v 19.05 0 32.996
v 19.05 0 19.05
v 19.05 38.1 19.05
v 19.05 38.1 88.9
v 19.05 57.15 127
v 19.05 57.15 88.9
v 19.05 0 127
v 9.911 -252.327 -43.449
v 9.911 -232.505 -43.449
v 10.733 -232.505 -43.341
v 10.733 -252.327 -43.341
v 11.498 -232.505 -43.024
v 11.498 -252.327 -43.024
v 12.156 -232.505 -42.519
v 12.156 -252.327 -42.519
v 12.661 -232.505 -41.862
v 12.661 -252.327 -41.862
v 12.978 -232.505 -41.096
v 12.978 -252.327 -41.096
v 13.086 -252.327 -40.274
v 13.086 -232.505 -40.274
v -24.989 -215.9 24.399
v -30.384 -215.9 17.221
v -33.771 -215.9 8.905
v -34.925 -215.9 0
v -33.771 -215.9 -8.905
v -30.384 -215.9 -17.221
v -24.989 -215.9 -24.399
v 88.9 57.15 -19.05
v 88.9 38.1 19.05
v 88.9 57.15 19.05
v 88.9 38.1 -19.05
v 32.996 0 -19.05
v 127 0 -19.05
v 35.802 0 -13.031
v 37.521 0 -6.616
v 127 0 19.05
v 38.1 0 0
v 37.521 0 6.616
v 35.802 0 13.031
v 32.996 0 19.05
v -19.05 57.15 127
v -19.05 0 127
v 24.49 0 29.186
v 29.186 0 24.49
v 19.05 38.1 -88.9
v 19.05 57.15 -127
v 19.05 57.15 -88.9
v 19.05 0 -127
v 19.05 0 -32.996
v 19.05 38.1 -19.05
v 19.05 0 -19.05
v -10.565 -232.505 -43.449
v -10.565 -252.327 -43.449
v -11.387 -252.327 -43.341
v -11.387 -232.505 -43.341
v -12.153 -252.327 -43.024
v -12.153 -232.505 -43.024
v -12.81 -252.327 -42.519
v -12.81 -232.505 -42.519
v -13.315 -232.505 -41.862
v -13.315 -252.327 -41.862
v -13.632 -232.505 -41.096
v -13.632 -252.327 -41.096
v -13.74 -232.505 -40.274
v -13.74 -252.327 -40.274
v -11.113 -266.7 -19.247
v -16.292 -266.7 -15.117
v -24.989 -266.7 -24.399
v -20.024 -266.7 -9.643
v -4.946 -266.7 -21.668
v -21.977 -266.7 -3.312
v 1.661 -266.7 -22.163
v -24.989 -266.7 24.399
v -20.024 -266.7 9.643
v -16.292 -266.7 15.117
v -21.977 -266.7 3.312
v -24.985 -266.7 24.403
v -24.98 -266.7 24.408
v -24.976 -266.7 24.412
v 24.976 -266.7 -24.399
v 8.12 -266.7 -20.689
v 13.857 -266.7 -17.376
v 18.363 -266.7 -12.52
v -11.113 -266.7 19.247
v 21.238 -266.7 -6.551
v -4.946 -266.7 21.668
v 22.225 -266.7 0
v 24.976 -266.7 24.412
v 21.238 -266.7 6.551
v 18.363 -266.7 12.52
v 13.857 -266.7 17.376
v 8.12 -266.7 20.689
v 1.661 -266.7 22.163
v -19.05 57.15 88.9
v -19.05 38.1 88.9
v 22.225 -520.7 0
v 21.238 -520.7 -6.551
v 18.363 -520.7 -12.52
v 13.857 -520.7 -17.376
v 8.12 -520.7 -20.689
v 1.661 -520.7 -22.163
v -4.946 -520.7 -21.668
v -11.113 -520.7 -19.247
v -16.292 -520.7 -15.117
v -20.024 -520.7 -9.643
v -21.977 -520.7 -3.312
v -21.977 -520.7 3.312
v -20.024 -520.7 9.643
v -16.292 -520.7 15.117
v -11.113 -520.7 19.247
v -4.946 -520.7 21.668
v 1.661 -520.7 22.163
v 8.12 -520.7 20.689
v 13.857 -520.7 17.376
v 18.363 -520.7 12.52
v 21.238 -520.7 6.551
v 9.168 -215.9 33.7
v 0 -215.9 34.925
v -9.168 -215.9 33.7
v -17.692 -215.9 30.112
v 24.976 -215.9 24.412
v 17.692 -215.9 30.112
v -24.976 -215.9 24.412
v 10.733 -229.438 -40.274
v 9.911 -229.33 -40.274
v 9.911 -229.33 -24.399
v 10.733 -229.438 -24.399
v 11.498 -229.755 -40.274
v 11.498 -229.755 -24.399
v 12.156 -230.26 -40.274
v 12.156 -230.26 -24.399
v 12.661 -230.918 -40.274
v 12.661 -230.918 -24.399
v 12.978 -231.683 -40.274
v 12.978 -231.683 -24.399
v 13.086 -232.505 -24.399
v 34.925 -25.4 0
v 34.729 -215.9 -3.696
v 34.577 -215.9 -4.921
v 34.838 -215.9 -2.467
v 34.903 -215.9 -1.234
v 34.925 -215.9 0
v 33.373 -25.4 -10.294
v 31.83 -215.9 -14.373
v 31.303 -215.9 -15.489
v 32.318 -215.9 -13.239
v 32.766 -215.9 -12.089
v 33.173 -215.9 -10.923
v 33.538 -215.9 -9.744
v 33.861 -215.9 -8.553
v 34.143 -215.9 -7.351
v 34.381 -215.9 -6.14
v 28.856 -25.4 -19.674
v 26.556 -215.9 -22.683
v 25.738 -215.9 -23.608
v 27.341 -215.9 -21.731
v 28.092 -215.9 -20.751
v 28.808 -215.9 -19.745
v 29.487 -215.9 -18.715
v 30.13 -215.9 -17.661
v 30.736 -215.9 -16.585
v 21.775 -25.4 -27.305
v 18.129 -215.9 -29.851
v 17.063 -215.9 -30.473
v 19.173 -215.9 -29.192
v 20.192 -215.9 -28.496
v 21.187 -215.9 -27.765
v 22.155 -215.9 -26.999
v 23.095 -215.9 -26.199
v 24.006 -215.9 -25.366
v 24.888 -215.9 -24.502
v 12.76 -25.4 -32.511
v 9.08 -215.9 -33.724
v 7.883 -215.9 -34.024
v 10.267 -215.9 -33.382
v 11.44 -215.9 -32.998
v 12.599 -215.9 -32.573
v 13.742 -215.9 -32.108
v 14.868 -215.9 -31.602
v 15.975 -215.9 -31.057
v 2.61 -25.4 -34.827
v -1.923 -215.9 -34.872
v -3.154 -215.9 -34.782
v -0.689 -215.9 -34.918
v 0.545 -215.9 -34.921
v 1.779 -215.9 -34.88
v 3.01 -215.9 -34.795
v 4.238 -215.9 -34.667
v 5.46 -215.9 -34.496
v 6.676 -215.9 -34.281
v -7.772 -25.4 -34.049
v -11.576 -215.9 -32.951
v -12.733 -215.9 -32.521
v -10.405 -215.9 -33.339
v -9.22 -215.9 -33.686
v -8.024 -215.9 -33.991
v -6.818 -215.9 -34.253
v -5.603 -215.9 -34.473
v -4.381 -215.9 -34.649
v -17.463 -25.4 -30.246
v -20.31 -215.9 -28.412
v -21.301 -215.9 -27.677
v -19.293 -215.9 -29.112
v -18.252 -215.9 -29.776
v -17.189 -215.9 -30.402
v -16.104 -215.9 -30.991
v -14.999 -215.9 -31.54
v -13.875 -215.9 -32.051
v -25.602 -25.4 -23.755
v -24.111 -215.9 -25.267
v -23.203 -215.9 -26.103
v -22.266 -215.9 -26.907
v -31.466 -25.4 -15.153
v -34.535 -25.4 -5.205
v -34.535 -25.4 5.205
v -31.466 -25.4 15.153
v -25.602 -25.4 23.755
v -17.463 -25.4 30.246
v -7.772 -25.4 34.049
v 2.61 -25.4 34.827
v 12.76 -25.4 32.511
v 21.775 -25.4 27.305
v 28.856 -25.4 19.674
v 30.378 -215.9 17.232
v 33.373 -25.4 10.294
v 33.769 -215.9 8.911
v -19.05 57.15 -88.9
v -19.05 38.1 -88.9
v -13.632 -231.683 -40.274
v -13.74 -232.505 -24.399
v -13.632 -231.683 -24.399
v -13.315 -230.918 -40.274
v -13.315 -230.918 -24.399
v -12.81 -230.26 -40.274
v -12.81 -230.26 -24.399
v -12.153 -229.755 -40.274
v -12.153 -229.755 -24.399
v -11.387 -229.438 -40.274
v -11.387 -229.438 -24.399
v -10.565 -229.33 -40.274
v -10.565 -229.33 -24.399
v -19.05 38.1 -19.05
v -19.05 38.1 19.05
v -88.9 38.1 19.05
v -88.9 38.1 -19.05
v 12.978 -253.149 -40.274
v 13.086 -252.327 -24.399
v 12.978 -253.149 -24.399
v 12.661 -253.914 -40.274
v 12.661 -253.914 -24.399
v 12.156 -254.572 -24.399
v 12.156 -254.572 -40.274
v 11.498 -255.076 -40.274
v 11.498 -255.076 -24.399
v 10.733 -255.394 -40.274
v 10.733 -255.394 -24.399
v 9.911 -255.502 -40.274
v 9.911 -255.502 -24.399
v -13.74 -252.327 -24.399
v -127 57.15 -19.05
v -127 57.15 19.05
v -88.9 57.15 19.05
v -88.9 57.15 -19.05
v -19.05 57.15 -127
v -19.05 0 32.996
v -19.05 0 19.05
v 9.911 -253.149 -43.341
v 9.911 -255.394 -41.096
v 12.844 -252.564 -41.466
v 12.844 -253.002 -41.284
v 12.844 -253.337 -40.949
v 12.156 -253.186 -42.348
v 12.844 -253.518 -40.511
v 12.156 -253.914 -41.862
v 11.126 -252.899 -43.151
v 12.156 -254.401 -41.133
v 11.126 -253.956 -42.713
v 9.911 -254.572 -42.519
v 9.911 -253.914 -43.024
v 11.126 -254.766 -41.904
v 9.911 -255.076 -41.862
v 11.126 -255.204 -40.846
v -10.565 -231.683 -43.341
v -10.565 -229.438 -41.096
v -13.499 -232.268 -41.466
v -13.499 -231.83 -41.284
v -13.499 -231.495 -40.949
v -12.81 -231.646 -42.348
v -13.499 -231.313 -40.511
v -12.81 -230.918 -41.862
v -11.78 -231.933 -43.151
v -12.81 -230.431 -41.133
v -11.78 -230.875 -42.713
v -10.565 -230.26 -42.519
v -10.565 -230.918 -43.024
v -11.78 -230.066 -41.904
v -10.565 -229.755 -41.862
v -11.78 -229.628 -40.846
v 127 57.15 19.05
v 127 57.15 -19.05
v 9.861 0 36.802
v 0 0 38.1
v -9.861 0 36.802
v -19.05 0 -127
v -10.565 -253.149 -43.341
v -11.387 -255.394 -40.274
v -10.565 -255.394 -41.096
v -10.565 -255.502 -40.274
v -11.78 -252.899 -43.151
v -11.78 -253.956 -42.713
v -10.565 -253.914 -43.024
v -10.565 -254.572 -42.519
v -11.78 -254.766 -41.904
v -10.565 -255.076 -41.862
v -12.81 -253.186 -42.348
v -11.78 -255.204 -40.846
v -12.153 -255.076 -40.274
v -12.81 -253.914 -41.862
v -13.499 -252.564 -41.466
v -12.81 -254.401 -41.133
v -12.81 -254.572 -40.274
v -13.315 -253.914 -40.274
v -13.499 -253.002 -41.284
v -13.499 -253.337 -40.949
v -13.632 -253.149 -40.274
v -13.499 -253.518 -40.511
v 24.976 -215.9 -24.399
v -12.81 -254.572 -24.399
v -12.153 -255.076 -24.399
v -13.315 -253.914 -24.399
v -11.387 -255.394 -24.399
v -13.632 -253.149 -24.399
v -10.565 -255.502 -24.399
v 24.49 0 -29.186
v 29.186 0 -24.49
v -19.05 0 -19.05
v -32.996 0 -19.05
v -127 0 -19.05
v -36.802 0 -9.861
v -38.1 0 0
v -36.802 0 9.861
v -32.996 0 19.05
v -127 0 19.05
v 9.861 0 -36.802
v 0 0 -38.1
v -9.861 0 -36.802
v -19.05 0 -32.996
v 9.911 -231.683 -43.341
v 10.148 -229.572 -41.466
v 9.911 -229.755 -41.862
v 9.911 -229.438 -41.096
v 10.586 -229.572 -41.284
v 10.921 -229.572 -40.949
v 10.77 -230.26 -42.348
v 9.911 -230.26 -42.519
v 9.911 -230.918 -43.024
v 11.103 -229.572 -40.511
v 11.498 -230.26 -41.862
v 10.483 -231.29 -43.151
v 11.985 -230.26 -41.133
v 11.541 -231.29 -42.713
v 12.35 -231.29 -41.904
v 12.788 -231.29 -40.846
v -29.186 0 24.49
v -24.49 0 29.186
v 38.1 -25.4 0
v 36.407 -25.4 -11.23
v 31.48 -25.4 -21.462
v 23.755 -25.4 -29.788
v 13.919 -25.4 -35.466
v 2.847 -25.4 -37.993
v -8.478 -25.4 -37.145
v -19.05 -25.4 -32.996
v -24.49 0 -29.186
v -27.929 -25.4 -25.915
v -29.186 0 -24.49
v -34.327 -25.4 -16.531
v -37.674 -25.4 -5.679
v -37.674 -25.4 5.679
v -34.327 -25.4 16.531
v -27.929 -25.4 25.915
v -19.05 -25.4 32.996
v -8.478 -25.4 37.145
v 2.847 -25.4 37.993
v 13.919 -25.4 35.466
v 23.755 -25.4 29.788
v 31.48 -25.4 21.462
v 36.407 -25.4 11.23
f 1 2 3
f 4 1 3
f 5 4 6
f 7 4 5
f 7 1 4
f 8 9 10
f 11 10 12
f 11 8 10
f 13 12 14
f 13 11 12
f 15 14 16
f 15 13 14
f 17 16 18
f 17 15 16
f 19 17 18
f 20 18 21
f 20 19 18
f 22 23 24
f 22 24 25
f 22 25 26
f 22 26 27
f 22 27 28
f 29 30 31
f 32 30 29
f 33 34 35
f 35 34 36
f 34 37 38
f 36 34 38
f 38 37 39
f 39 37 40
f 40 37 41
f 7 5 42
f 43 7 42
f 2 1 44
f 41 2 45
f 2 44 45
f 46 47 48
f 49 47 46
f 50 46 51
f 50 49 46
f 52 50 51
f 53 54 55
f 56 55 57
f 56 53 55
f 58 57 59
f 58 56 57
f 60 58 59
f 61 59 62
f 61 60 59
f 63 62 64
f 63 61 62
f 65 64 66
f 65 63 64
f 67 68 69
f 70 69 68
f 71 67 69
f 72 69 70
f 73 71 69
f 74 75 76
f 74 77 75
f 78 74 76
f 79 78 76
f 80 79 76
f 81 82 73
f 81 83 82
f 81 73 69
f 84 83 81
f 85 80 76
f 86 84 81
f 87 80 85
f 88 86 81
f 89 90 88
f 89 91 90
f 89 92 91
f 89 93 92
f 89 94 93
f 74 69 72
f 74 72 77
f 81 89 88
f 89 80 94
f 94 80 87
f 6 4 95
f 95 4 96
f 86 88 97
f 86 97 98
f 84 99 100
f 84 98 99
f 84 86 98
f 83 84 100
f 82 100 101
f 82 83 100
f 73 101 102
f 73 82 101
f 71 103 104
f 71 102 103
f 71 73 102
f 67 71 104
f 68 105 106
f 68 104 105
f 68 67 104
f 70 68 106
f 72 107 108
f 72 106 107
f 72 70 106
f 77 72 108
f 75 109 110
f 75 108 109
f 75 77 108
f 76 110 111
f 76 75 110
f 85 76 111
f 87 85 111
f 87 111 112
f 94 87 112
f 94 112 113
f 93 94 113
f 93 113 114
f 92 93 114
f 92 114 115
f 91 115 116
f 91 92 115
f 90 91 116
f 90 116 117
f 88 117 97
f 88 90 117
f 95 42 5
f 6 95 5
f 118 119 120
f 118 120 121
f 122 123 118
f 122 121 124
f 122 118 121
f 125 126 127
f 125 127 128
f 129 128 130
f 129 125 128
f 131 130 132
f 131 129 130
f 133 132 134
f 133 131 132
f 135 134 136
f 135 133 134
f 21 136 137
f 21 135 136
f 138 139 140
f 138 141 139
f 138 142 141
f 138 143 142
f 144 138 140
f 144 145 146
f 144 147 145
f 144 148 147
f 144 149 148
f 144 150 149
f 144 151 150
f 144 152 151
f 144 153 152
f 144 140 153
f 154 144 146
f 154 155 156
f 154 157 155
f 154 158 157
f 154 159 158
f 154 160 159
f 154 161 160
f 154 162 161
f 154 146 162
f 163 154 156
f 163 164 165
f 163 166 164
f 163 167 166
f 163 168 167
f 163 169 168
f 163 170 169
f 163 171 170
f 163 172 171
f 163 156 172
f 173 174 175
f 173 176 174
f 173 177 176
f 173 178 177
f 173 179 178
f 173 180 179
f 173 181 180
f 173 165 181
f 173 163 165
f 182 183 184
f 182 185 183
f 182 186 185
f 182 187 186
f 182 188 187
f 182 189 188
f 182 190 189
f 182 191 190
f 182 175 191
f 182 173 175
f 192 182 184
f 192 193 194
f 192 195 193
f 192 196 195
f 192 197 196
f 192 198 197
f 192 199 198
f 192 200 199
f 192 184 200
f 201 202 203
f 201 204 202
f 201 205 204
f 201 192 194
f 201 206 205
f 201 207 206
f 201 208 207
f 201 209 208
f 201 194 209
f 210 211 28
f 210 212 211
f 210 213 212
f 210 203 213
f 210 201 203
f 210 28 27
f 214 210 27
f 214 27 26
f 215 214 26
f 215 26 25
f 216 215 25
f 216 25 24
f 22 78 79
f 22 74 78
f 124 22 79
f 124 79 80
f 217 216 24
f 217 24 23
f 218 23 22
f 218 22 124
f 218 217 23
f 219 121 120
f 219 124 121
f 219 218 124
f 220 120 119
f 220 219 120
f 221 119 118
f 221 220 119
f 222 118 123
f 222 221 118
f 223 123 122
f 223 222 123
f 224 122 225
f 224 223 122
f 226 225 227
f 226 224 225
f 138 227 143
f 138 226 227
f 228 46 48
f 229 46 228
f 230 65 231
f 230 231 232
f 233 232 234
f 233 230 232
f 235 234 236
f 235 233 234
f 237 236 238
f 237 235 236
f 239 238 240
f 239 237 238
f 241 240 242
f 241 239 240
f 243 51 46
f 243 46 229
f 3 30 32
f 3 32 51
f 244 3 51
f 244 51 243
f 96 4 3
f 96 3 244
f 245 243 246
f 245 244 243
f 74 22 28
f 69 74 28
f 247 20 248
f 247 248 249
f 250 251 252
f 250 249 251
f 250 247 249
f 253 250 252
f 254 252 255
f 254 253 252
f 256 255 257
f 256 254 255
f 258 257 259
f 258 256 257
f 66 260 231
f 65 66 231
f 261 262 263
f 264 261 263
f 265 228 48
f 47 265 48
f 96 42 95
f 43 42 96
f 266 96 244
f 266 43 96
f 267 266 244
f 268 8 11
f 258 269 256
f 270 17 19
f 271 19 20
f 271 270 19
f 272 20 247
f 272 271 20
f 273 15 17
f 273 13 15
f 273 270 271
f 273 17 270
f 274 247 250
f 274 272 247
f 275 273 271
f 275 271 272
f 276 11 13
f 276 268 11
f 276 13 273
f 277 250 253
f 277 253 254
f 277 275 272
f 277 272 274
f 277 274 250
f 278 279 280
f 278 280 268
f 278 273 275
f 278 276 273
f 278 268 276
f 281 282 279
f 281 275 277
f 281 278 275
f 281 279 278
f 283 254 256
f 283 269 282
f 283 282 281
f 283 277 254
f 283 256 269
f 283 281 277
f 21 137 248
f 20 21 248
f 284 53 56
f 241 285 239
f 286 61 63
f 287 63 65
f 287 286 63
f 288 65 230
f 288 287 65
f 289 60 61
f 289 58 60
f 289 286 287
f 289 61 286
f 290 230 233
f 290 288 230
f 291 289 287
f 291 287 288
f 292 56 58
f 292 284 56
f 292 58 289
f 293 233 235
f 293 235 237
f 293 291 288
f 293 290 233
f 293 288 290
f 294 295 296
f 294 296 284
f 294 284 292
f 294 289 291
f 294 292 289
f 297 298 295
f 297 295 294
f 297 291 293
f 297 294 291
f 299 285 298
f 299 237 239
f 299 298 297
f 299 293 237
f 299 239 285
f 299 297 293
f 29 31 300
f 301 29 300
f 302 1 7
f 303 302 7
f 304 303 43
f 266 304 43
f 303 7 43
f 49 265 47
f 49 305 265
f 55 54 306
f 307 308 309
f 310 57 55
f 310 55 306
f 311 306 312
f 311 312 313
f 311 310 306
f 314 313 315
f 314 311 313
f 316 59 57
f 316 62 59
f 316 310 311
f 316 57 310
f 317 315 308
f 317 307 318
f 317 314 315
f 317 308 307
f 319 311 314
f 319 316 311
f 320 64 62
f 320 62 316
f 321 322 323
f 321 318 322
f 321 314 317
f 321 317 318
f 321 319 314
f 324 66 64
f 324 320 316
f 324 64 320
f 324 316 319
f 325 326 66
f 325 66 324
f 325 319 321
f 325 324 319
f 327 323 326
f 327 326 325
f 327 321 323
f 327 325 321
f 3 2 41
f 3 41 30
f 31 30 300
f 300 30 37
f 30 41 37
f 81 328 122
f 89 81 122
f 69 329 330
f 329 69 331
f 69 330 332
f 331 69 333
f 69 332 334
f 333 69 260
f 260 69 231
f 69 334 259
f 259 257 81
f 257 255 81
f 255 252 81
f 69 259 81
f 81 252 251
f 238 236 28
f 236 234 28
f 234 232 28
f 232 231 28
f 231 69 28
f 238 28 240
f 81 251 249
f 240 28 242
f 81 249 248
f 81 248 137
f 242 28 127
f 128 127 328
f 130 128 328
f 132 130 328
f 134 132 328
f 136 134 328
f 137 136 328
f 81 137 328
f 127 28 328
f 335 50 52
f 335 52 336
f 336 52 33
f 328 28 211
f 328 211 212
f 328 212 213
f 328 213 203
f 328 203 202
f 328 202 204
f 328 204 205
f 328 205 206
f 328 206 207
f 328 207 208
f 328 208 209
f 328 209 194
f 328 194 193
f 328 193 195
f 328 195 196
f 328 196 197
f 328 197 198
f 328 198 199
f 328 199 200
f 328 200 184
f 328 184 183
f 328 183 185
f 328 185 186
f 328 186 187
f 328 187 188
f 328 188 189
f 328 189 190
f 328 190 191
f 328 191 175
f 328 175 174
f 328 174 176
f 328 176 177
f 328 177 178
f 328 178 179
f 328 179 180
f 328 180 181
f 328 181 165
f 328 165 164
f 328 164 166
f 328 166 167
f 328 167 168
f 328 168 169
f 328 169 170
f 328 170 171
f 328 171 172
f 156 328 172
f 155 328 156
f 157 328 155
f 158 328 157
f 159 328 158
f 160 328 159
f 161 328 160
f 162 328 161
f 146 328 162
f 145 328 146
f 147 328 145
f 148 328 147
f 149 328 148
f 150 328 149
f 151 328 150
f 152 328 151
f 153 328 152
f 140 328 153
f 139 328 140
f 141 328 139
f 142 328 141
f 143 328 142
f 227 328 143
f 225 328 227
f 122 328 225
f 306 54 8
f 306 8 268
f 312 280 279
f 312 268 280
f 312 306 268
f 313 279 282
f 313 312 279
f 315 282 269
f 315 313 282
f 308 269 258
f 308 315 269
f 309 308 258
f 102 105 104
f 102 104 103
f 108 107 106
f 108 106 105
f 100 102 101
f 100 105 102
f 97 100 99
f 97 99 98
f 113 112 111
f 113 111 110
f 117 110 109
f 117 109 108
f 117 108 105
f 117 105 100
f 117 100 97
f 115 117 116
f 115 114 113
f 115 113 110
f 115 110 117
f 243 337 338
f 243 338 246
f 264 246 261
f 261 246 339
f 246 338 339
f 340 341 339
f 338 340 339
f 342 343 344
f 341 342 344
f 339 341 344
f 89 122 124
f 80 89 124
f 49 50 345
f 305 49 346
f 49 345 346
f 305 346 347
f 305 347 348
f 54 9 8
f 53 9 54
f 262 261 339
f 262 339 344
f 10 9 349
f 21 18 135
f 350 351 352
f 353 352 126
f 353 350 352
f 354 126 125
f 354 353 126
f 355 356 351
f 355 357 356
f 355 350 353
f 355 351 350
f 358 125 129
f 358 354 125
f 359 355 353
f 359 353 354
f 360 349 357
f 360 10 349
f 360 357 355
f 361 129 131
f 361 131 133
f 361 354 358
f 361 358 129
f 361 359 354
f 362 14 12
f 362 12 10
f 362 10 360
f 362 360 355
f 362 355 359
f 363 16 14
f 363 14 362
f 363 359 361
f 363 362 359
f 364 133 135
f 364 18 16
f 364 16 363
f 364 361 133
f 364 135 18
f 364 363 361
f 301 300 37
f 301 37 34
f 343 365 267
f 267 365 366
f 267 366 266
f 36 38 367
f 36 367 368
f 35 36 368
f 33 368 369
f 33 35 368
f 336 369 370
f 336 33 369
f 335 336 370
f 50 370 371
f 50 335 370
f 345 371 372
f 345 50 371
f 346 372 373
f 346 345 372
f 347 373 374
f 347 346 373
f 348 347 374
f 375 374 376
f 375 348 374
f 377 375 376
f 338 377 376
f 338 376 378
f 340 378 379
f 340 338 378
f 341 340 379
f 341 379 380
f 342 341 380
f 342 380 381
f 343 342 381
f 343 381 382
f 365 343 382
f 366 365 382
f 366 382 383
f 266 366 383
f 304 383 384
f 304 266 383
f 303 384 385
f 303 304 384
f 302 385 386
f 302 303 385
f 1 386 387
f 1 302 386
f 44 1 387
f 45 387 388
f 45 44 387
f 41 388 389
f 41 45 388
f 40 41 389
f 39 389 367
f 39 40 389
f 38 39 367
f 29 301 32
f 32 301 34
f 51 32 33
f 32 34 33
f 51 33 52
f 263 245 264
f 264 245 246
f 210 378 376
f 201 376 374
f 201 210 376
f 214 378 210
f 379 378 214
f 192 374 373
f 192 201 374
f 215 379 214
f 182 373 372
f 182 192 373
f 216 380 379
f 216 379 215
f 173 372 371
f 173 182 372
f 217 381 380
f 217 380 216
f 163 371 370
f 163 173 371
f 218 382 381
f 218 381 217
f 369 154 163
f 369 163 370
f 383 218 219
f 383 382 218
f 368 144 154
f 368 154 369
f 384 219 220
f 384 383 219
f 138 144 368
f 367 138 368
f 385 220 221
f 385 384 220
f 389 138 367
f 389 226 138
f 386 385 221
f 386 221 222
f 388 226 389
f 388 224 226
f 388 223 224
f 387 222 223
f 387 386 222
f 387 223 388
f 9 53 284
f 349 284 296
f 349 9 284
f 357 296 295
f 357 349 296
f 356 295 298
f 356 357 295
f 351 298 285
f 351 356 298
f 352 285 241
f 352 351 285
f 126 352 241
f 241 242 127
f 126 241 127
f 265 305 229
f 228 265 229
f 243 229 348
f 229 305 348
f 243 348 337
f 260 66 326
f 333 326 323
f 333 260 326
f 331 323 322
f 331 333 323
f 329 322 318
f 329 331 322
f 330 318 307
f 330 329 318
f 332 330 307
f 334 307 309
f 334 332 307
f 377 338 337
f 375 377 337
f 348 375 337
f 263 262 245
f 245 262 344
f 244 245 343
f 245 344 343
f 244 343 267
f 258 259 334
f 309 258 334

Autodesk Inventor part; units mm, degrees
ref_plane "YZ Plane" through (0, 0, 0) normal (1, 0, 0) x (0, 1, 0)
ref_plane "XZ Plane" through (0, 0, 0) normal (0, 1, 0) x (-1, 0, 0)
ref_plane "XY Plane" through (0, 0, 0) normal (0, 0, 1) x (1, 0, 0)
sketch "Sketch1" plane through (0, 0, 0) normal (0, 1, 0) x (-1, 0, 0)
  line L0 (-127, 19.05) -> (-127, -19.05)
  line L1 (127, -19.05) -> (127, 19.05)
  line L2 (0, -127) -> (19.05, -127)
  line L3 (19.05, -127) -> (19.05, -19.05)
  line L4 (19.05, 0) -> (0, 0)
  line L5 (0, -127) -> (-19.05, -127)
  line L6 (-19.05, -127) -> (-19.05, -19.05)
  line L7 (-19.05, 0) -> (0, 0)
  line L8 (0, 0) -> (0, -127)
  line L9 (19.05, 0) -> (0, 0)
  line L10 (-19.05, 0) -> (-19.05, 127)
  line L11 (-19.05, 127) -> (19.05, 127)
  line L12 (19.05, 127) -> (19.05, 19.05)
  line L13 (-127, -19.05) -> (-19.05, -19.05)
  line L14 (19.05, -19.05) -> (127, -19.05)
  line L15 (127, 19.05) -> (19.05, 19.05)
  line L16 (-19.05, 19.05) -> (-127, 19.05)
  point P0 (127, 0)
  point P1 (-127, 0)
  point P2 (0, 19.05)
  point P3 (0, -19.05)
  dimension "d7" = 127
  dimension "d8" = 19.05
  dimension "d9" = 127
extrude "Extrusion1" add sketch "Sketch1" along normal blind 38.1
sketch "Sketch2" plane through (0, 38.1, 0) normal (0, 1, 0) x (1, 0, 0)
  line L0 (-19.05, -127) -> (19.05, -127) projected
  line L1 (-19.05, -127) -> (19.05, -127)
  line L2 (19.05, -127) -> (19.05, -88.9)
  line L3 (19.05, -88.9) -> (-19.05, -88.9)
  line L4 (-19.05, -88.9) -> (-19.05, -127)
  line L5 (-19.05, 127) -> (-19.05, 19.05) projected
  line L6 (19.05, 19.05) -> (19.05, 127) projected
  line L7 (-19.05, 127) -> (19.05, 127)
  line L8 (19.05, 127) -> (19.05, 88.9)
  line L9 (19.05, 88.9) -> (-19.05, 88.9)
  line L10 (-19.05, 88.9) -> (-19.05, 127)
  line L11 (-127, -19.05) -> (-19.05, -19.05) projected
  line L12 (-19.05, 19.05) -> (-127, 19.05) projected
  line L13 (-127, -19.05) -> (-88.9, -19.05)
  line L14 (-88.9, -19.05) -> (-88.9, 19.05)
  line L15 (-88.9, 19.05) -> (-127, 19.05)
  line L16 (-127, 19.05) -> (-127, -19.05)
  line L17 (127, -19.05) -> (127, 19.05) projected
  line L18 (127, 19.05) -> (19.05, 19.05) projected
  line L19 (127, -19.05) -> (88.9, -19.05)
  line L20 (88.9, -19.05) -> (88.9, 19.05)
  line L21 (88.9, 19.05) -> (127, 19.05)
  line L22 (127, 19.05) -> (127, -19.05)
  point P0 (0, 0)
  point P1 (-19.05, 88.9)
  dimension "d12" = 38.1
  dimension "d13" = 38.1
  dimension "d14" = 38.1
  dimension "d15" = 38.1
  dimension "d16" = 38.1
extrude "Extrusion2" add sketch "Sketch2" along normal blind 19.05
sketch "Sketch3" plane through (0, 0, 0) normal (0, -1, 0) x (1, 0, 0)
  circle A0 centre (0, 0) radius 38.1
  dimension "d19" = 76.2
extrude "Extrusion3" add sketch "Sketch3" along normal blind 25.4
sketch "Sketch4" plane through (0, -25.4, 0) normal (0, -1, 0) x (1, 0, 0)
  circle A0 centre (0, 0) radius 34.925
  dimension "d22" = 69.85
extrude "Extrusion4" add sketch "Sketch4" along normal blind 190.5
sketch "Sketch5" plane through (0, -215.9, 0) normal (0, -1, 0) x (1, 0, 0)
  circle A0 centre (0, 0) radius 34.925 projected
  line L0 (24.9762, 24.412) -> (-24.9888, 24.412)
  line L1 (-24.9888, 24.412) -> (-24.9888, -24.3991)
  line L2 (-24.9888, -24.3991) -> (24.9762, -24.3991)
  line L3 (24.9762, -24.3991) -> (24.9762, 24.412)
  point P0 (-24.9762, 24.412)
  point P1 (-24.9888, 24.3991)
extrude "Extrusion5" add sketch "Sketch5" along normal blind 50.8 contours L3 L2 L1 A0 L0
sketch "Sketch6" plane through (24.9762, -215.9, -24.3991) normal (0, 0, -1) x (-1, 0, 0)
  line L0 (11.8903, -39.6018) -> (38.7164, -39.6018)
  line L1 (38.7164, -39.6018) -> (38.7164, -13.4301)
  line L2 (38.7164, -13.4301) -> (11.8903, -13.4301)
  line L3 (11.8903, -13.4301) -> (11.8903, -39.6018)
  point P0 (24.9762, 215.9)
extrude "Extrusion6" add sketch "Sketch6" along normal blind 19.05
fillet "Fillet1" radius 3.175 7 edges at (-0.3271, -255.5018, -43.4491) (13.0859, -255.5018, -33.9241) (13.0859, -242.416, -43.4491) (13.0859, -229.3301, -33.9241) (-0.3271, -229.3301, -43.4491) (-13.7402, -229.3301, -33.9241) (-13.7402, -242.416, -43.4491)
fillet "Fillet2" radius 3.175 2 edges at (-12.8102, -254.5719, -42.5191) (-13.7402, -255.5018, -32.3366)
sketch "Sketch7" plane through (0, -266.7, 0) normal (0, -1, 0) x (1, 0, 0)
  circle A0 centre (0, 0) radius 22.225
  dimension "d31" = 44.45
extrude "Extrusion7" add sketch "Sketch7" along normal blind 254
sketch "Sketch8" plane through (0, -520.7, 0) normal (0, -1, 0) x (1, 0, 0)
  point P0 (0, 0)
properties part number "stand"
